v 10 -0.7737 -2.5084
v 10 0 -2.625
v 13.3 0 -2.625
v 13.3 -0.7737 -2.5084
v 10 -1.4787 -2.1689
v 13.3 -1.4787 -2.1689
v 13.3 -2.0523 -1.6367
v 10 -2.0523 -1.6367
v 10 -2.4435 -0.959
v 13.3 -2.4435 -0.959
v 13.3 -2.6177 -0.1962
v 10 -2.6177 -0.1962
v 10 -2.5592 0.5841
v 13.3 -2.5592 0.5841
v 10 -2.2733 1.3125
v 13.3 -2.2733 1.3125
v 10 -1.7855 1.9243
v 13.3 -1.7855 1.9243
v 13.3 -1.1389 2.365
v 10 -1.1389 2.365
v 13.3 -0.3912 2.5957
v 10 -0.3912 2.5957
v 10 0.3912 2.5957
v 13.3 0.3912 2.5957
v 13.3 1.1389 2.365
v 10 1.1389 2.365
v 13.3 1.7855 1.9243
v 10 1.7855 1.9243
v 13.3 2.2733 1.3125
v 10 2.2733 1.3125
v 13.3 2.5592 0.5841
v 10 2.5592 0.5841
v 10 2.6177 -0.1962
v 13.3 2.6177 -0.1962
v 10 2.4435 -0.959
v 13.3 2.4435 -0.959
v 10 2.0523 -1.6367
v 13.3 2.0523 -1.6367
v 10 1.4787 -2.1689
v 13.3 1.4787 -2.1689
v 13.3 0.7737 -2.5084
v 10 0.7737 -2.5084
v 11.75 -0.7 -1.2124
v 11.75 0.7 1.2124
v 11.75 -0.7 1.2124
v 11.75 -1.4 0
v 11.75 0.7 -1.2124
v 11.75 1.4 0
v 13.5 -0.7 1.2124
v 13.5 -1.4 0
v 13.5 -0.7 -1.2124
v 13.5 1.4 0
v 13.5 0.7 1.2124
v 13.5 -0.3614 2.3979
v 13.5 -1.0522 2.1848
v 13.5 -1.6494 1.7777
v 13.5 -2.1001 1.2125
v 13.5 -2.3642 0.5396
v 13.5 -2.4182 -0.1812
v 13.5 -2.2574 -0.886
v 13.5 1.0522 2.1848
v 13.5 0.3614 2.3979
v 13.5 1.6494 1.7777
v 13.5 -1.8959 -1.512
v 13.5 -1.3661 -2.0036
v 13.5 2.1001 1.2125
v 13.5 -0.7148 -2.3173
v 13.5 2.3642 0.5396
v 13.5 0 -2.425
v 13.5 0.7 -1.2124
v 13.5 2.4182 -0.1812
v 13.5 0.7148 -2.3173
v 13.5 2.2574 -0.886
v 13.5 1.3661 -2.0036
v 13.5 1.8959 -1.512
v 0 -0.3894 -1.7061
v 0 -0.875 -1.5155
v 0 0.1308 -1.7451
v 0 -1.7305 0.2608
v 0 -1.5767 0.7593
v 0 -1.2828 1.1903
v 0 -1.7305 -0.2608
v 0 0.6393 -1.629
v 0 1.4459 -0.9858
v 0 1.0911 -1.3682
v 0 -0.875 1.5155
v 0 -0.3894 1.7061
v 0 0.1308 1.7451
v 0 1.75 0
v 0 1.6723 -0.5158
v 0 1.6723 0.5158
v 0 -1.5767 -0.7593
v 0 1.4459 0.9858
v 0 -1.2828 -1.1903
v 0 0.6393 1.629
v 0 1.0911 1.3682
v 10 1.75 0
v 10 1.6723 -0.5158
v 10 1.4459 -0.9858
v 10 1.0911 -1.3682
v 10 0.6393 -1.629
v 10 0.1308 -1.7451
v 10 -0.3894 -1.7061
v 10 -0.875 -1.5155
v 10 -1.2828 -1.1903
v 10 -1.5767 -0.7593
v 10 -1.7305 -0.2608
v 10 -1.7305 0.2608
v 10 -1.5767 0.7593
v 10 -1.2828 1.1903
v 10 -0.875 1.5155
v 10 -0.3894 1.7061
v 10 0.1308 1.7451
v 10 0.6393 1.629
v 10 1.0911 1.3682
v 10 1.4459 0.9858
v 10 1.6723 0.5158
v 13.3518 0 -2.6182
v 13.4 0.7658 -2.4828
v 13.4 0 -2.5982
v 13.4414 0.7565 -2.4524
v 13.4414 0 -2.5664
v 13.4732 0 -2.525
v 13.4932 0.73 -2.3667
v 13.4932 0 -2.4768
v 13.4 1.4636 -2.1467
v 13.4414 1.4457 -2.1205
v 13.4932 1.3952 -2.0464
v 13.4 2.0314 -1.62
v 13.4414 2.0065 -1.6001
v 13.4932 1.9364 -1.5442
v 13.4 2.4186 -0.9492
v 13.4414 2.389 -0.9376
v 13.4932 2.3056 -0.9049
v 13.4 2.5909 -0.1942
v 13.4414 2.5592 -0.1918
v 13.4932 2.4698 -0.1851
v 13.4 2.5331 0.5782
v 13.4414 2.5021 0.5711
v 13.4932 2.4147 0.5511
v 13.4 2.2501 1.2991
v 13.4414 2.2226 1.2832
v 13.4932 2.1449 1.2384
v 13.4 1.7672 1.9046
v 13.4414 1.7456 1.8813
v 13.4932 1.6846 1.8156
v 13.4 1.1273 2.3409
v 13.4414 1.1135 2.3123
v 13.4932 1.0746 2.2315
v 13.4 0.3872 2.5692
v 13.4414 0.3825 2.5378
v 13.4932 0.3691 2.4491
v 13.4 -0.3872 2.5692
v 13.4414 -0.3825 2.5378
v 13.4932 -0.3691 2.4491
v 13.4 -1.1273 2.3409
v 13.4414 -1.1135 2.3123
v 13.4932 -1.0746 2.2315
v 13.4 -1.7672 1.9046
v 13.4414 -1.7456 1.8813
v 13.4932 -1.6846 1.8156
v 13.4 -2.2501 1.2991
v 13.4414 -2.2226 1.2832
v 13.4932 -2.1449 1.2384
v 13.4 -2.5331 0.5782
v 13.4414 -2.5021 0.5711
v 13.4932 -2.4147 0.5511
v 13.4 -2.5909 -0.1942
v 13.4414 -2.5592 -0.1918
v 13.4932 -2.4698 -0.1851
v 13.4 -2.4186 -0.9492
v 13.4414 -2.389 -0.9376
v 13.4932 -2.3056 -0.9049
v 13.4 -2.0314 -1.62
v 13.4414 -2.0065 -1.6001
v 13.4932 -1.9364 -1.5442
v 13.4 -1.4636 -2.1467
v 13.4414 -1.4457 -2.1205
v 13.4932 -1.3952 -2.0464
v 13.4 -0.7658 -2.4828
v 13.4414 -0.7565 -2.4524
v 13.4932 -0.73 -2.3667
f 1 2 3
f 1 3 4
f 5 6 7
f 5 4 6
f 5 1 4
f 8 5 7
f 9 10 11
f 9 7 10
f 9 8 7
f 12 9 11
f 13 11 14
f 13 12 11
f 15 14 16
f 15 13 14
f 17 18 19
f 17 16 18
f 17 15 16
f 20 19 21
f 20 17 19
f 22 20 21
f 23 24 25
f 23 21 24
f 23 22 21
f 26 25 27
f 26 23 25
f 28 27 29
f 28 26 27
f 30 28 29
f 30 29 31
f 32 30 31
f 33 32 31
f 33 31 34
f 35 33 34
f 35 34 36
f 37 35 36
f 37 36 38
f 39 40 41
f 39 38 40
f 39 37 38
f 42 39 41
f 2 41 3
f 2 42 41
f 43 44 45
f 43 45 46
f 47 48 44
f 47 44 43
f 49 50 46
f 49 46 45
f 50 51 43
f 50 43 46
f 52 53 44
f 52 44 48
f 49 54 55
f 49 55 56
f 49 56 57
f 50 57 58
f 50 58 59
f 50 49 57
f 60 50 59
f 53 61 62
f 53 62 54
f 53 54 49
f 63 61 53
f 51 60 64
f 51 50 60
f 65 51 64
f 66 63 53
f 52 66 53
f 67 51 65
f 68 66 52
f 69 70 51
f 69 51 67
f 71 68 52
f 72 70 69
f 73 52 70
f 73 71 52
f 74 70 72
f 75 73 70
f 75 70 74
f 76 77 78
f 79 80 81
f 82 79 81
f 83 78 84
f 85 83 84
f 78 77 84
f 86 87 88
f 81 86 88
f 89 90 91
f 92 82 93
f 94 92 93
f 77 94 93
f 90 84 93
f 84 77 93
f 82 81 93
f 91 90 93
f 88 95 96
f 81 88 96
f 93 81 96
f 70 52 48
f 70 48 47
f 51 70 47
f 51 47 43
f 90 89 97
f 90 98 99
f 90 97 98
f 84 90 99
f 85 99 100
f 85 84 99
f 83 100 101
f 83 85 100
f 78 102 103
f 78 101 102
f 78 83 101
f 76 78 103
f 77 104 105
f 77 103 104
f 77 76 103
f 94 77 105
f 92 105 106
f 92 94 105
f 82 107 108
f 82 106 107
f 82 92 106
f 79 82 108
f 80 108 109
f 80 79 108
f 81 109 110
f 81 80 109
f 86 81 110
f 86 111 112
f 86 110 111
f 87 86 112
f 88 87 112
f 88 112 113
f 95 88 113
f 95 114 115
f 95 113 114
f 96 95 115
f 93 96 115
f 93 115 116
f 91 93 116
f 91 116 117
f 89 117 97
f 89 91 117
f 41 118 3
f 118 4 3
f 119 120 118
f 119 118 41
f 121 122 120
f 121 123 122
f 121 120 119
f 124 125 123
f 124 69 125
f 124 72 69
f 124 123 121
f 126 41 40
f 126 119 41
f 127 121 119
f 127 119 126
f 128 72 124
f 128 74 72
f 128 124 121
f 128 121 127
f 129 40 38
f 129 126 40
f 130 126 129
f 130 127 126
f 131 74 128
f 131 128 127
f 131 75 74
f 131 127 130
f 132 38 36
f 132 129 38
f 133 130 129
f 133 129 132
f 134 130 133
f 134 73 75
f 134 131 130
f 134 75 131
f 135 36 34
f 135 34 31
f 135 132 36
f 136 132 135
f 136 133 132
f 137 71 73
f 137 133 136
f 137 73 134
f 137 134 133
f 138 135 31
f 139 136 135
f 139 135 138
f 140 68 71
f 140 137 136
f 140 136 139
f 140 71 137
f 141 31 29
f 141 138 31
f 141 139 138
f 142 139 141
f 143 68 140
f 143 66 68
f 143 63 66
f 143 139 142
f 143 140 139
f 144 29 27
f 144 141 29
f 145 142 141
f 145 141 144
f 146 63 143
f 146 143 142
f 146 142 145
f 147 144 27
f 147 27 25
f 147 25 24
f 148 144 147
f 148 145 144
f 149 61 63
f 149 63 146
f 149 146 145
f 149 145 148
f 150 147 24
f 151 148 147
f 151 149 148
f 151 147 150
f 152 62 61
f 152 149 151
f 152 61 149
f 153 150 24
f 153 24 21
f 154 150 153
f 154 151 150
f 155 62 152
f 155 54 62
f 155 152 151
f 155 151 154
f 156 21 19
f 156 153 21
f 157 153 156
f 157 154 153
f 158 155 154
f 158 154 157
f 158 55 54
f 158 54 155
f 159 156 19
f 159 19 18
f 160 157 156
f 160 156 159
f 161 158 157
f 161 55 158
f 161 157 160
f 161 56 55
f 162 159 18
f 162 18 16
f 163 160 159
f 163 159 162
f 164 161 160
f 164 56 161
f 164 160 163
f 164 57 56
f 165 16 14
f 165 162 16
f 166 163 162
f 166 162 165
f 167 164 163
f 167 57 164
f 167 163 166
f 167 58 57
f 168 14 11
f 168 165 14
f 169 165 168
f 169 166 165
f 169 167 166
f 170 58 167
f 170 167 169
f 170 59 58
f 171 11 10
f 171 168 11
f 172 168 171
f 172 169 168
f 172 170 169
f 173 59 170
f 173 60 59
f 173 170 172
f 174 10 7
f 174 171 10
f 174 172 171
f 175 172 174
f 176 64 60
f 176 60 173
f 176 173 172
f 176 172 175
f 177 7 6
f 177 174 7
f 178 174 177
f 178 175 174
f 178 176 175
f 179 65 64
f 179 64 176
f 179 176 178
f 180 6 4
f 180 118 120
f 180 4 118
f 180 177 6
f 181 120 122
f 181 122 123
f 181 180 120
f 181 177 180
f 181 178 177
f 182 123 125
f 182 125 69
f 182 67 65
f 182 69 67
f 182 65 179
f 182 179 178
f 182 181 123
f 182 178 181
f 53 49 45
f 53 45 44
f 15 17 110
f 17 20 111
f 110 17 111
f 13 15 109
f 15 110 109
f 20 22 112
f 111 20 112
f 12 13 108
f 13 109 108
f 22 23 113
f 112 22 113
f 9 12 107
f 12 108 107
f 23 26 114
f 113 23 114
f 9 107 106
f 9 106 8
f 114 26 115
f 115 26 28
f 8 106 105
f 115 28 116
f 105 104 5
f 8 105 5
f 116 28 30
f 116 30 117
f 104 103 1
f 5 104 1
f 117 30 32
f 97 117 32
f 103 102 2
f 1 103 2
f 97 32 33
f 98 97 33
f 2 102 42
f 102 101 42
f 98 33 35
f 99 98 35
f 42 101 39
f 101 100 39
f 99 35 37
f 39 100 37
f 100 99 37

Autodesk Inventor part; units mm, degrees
ref_plane "YZ Plane" through (0, 0, 0) normal (1, 0, 0) x (0, 1, 0)
ref_plane "XZ Plane" through (0, 0, 0) normal (0, 1, 0) x (-1, 0, 0)
sketch "Sketch1" plane through (0, 0, 0) normal (1, 0, 0) x (0, 1, 0)
  circle A0 centre (0, 0) radius 1.75
  dimension "d0" = 3.5
extrude "Extrusion1" add sketch "Sketch1" along normal blind 10
sketch "Sketch2" plane through (10, 0, 0) normal (1, 0, 0) x (0, 0, -1)
  circle A0 centre (0, 0) radius 2.625
  dimension "d3" = 5.25
extrude "Extrusion2" add sketch "Sketch2" along normal blind 3.5
ref_plane "Work Plane1" through (13.5, 0, 0) normal (1, 0, 0) x (0, 0, -1)
sketch "Sketch3" plane through (13.5, 0, 0) normal (1, 0, 0) x (0, 0, -1)
  line L0 (0, -1.4) -> (-1.2124, -0.7)
  line L1 (-1.2124, -0.7) -> (-1.2124, 0.7)
  line L2 (-1.2124, 0.7) -> (0, 1.4)
  line L3 (0, 1.4) -> (1.2124, 0.7)
  line L4 (1.2124, 0.7) -> (1.2124, -0.7)
  line L5 (1.2124, -0.7) -> (0, -1.4)
  point P0 (0, 0)
  point P1 (0, 0)
  dimension "d9" = 2.8
  dimension "d10" = 1.2124
extrude "Extrusion3" cut sketch "Sketch3" against normal blind 1.75
fillet "Fillet2" radius 0.2 1 edges at (13.5, 0, 2.625)
properties part number "M3.5" material "Iron, Cast"
